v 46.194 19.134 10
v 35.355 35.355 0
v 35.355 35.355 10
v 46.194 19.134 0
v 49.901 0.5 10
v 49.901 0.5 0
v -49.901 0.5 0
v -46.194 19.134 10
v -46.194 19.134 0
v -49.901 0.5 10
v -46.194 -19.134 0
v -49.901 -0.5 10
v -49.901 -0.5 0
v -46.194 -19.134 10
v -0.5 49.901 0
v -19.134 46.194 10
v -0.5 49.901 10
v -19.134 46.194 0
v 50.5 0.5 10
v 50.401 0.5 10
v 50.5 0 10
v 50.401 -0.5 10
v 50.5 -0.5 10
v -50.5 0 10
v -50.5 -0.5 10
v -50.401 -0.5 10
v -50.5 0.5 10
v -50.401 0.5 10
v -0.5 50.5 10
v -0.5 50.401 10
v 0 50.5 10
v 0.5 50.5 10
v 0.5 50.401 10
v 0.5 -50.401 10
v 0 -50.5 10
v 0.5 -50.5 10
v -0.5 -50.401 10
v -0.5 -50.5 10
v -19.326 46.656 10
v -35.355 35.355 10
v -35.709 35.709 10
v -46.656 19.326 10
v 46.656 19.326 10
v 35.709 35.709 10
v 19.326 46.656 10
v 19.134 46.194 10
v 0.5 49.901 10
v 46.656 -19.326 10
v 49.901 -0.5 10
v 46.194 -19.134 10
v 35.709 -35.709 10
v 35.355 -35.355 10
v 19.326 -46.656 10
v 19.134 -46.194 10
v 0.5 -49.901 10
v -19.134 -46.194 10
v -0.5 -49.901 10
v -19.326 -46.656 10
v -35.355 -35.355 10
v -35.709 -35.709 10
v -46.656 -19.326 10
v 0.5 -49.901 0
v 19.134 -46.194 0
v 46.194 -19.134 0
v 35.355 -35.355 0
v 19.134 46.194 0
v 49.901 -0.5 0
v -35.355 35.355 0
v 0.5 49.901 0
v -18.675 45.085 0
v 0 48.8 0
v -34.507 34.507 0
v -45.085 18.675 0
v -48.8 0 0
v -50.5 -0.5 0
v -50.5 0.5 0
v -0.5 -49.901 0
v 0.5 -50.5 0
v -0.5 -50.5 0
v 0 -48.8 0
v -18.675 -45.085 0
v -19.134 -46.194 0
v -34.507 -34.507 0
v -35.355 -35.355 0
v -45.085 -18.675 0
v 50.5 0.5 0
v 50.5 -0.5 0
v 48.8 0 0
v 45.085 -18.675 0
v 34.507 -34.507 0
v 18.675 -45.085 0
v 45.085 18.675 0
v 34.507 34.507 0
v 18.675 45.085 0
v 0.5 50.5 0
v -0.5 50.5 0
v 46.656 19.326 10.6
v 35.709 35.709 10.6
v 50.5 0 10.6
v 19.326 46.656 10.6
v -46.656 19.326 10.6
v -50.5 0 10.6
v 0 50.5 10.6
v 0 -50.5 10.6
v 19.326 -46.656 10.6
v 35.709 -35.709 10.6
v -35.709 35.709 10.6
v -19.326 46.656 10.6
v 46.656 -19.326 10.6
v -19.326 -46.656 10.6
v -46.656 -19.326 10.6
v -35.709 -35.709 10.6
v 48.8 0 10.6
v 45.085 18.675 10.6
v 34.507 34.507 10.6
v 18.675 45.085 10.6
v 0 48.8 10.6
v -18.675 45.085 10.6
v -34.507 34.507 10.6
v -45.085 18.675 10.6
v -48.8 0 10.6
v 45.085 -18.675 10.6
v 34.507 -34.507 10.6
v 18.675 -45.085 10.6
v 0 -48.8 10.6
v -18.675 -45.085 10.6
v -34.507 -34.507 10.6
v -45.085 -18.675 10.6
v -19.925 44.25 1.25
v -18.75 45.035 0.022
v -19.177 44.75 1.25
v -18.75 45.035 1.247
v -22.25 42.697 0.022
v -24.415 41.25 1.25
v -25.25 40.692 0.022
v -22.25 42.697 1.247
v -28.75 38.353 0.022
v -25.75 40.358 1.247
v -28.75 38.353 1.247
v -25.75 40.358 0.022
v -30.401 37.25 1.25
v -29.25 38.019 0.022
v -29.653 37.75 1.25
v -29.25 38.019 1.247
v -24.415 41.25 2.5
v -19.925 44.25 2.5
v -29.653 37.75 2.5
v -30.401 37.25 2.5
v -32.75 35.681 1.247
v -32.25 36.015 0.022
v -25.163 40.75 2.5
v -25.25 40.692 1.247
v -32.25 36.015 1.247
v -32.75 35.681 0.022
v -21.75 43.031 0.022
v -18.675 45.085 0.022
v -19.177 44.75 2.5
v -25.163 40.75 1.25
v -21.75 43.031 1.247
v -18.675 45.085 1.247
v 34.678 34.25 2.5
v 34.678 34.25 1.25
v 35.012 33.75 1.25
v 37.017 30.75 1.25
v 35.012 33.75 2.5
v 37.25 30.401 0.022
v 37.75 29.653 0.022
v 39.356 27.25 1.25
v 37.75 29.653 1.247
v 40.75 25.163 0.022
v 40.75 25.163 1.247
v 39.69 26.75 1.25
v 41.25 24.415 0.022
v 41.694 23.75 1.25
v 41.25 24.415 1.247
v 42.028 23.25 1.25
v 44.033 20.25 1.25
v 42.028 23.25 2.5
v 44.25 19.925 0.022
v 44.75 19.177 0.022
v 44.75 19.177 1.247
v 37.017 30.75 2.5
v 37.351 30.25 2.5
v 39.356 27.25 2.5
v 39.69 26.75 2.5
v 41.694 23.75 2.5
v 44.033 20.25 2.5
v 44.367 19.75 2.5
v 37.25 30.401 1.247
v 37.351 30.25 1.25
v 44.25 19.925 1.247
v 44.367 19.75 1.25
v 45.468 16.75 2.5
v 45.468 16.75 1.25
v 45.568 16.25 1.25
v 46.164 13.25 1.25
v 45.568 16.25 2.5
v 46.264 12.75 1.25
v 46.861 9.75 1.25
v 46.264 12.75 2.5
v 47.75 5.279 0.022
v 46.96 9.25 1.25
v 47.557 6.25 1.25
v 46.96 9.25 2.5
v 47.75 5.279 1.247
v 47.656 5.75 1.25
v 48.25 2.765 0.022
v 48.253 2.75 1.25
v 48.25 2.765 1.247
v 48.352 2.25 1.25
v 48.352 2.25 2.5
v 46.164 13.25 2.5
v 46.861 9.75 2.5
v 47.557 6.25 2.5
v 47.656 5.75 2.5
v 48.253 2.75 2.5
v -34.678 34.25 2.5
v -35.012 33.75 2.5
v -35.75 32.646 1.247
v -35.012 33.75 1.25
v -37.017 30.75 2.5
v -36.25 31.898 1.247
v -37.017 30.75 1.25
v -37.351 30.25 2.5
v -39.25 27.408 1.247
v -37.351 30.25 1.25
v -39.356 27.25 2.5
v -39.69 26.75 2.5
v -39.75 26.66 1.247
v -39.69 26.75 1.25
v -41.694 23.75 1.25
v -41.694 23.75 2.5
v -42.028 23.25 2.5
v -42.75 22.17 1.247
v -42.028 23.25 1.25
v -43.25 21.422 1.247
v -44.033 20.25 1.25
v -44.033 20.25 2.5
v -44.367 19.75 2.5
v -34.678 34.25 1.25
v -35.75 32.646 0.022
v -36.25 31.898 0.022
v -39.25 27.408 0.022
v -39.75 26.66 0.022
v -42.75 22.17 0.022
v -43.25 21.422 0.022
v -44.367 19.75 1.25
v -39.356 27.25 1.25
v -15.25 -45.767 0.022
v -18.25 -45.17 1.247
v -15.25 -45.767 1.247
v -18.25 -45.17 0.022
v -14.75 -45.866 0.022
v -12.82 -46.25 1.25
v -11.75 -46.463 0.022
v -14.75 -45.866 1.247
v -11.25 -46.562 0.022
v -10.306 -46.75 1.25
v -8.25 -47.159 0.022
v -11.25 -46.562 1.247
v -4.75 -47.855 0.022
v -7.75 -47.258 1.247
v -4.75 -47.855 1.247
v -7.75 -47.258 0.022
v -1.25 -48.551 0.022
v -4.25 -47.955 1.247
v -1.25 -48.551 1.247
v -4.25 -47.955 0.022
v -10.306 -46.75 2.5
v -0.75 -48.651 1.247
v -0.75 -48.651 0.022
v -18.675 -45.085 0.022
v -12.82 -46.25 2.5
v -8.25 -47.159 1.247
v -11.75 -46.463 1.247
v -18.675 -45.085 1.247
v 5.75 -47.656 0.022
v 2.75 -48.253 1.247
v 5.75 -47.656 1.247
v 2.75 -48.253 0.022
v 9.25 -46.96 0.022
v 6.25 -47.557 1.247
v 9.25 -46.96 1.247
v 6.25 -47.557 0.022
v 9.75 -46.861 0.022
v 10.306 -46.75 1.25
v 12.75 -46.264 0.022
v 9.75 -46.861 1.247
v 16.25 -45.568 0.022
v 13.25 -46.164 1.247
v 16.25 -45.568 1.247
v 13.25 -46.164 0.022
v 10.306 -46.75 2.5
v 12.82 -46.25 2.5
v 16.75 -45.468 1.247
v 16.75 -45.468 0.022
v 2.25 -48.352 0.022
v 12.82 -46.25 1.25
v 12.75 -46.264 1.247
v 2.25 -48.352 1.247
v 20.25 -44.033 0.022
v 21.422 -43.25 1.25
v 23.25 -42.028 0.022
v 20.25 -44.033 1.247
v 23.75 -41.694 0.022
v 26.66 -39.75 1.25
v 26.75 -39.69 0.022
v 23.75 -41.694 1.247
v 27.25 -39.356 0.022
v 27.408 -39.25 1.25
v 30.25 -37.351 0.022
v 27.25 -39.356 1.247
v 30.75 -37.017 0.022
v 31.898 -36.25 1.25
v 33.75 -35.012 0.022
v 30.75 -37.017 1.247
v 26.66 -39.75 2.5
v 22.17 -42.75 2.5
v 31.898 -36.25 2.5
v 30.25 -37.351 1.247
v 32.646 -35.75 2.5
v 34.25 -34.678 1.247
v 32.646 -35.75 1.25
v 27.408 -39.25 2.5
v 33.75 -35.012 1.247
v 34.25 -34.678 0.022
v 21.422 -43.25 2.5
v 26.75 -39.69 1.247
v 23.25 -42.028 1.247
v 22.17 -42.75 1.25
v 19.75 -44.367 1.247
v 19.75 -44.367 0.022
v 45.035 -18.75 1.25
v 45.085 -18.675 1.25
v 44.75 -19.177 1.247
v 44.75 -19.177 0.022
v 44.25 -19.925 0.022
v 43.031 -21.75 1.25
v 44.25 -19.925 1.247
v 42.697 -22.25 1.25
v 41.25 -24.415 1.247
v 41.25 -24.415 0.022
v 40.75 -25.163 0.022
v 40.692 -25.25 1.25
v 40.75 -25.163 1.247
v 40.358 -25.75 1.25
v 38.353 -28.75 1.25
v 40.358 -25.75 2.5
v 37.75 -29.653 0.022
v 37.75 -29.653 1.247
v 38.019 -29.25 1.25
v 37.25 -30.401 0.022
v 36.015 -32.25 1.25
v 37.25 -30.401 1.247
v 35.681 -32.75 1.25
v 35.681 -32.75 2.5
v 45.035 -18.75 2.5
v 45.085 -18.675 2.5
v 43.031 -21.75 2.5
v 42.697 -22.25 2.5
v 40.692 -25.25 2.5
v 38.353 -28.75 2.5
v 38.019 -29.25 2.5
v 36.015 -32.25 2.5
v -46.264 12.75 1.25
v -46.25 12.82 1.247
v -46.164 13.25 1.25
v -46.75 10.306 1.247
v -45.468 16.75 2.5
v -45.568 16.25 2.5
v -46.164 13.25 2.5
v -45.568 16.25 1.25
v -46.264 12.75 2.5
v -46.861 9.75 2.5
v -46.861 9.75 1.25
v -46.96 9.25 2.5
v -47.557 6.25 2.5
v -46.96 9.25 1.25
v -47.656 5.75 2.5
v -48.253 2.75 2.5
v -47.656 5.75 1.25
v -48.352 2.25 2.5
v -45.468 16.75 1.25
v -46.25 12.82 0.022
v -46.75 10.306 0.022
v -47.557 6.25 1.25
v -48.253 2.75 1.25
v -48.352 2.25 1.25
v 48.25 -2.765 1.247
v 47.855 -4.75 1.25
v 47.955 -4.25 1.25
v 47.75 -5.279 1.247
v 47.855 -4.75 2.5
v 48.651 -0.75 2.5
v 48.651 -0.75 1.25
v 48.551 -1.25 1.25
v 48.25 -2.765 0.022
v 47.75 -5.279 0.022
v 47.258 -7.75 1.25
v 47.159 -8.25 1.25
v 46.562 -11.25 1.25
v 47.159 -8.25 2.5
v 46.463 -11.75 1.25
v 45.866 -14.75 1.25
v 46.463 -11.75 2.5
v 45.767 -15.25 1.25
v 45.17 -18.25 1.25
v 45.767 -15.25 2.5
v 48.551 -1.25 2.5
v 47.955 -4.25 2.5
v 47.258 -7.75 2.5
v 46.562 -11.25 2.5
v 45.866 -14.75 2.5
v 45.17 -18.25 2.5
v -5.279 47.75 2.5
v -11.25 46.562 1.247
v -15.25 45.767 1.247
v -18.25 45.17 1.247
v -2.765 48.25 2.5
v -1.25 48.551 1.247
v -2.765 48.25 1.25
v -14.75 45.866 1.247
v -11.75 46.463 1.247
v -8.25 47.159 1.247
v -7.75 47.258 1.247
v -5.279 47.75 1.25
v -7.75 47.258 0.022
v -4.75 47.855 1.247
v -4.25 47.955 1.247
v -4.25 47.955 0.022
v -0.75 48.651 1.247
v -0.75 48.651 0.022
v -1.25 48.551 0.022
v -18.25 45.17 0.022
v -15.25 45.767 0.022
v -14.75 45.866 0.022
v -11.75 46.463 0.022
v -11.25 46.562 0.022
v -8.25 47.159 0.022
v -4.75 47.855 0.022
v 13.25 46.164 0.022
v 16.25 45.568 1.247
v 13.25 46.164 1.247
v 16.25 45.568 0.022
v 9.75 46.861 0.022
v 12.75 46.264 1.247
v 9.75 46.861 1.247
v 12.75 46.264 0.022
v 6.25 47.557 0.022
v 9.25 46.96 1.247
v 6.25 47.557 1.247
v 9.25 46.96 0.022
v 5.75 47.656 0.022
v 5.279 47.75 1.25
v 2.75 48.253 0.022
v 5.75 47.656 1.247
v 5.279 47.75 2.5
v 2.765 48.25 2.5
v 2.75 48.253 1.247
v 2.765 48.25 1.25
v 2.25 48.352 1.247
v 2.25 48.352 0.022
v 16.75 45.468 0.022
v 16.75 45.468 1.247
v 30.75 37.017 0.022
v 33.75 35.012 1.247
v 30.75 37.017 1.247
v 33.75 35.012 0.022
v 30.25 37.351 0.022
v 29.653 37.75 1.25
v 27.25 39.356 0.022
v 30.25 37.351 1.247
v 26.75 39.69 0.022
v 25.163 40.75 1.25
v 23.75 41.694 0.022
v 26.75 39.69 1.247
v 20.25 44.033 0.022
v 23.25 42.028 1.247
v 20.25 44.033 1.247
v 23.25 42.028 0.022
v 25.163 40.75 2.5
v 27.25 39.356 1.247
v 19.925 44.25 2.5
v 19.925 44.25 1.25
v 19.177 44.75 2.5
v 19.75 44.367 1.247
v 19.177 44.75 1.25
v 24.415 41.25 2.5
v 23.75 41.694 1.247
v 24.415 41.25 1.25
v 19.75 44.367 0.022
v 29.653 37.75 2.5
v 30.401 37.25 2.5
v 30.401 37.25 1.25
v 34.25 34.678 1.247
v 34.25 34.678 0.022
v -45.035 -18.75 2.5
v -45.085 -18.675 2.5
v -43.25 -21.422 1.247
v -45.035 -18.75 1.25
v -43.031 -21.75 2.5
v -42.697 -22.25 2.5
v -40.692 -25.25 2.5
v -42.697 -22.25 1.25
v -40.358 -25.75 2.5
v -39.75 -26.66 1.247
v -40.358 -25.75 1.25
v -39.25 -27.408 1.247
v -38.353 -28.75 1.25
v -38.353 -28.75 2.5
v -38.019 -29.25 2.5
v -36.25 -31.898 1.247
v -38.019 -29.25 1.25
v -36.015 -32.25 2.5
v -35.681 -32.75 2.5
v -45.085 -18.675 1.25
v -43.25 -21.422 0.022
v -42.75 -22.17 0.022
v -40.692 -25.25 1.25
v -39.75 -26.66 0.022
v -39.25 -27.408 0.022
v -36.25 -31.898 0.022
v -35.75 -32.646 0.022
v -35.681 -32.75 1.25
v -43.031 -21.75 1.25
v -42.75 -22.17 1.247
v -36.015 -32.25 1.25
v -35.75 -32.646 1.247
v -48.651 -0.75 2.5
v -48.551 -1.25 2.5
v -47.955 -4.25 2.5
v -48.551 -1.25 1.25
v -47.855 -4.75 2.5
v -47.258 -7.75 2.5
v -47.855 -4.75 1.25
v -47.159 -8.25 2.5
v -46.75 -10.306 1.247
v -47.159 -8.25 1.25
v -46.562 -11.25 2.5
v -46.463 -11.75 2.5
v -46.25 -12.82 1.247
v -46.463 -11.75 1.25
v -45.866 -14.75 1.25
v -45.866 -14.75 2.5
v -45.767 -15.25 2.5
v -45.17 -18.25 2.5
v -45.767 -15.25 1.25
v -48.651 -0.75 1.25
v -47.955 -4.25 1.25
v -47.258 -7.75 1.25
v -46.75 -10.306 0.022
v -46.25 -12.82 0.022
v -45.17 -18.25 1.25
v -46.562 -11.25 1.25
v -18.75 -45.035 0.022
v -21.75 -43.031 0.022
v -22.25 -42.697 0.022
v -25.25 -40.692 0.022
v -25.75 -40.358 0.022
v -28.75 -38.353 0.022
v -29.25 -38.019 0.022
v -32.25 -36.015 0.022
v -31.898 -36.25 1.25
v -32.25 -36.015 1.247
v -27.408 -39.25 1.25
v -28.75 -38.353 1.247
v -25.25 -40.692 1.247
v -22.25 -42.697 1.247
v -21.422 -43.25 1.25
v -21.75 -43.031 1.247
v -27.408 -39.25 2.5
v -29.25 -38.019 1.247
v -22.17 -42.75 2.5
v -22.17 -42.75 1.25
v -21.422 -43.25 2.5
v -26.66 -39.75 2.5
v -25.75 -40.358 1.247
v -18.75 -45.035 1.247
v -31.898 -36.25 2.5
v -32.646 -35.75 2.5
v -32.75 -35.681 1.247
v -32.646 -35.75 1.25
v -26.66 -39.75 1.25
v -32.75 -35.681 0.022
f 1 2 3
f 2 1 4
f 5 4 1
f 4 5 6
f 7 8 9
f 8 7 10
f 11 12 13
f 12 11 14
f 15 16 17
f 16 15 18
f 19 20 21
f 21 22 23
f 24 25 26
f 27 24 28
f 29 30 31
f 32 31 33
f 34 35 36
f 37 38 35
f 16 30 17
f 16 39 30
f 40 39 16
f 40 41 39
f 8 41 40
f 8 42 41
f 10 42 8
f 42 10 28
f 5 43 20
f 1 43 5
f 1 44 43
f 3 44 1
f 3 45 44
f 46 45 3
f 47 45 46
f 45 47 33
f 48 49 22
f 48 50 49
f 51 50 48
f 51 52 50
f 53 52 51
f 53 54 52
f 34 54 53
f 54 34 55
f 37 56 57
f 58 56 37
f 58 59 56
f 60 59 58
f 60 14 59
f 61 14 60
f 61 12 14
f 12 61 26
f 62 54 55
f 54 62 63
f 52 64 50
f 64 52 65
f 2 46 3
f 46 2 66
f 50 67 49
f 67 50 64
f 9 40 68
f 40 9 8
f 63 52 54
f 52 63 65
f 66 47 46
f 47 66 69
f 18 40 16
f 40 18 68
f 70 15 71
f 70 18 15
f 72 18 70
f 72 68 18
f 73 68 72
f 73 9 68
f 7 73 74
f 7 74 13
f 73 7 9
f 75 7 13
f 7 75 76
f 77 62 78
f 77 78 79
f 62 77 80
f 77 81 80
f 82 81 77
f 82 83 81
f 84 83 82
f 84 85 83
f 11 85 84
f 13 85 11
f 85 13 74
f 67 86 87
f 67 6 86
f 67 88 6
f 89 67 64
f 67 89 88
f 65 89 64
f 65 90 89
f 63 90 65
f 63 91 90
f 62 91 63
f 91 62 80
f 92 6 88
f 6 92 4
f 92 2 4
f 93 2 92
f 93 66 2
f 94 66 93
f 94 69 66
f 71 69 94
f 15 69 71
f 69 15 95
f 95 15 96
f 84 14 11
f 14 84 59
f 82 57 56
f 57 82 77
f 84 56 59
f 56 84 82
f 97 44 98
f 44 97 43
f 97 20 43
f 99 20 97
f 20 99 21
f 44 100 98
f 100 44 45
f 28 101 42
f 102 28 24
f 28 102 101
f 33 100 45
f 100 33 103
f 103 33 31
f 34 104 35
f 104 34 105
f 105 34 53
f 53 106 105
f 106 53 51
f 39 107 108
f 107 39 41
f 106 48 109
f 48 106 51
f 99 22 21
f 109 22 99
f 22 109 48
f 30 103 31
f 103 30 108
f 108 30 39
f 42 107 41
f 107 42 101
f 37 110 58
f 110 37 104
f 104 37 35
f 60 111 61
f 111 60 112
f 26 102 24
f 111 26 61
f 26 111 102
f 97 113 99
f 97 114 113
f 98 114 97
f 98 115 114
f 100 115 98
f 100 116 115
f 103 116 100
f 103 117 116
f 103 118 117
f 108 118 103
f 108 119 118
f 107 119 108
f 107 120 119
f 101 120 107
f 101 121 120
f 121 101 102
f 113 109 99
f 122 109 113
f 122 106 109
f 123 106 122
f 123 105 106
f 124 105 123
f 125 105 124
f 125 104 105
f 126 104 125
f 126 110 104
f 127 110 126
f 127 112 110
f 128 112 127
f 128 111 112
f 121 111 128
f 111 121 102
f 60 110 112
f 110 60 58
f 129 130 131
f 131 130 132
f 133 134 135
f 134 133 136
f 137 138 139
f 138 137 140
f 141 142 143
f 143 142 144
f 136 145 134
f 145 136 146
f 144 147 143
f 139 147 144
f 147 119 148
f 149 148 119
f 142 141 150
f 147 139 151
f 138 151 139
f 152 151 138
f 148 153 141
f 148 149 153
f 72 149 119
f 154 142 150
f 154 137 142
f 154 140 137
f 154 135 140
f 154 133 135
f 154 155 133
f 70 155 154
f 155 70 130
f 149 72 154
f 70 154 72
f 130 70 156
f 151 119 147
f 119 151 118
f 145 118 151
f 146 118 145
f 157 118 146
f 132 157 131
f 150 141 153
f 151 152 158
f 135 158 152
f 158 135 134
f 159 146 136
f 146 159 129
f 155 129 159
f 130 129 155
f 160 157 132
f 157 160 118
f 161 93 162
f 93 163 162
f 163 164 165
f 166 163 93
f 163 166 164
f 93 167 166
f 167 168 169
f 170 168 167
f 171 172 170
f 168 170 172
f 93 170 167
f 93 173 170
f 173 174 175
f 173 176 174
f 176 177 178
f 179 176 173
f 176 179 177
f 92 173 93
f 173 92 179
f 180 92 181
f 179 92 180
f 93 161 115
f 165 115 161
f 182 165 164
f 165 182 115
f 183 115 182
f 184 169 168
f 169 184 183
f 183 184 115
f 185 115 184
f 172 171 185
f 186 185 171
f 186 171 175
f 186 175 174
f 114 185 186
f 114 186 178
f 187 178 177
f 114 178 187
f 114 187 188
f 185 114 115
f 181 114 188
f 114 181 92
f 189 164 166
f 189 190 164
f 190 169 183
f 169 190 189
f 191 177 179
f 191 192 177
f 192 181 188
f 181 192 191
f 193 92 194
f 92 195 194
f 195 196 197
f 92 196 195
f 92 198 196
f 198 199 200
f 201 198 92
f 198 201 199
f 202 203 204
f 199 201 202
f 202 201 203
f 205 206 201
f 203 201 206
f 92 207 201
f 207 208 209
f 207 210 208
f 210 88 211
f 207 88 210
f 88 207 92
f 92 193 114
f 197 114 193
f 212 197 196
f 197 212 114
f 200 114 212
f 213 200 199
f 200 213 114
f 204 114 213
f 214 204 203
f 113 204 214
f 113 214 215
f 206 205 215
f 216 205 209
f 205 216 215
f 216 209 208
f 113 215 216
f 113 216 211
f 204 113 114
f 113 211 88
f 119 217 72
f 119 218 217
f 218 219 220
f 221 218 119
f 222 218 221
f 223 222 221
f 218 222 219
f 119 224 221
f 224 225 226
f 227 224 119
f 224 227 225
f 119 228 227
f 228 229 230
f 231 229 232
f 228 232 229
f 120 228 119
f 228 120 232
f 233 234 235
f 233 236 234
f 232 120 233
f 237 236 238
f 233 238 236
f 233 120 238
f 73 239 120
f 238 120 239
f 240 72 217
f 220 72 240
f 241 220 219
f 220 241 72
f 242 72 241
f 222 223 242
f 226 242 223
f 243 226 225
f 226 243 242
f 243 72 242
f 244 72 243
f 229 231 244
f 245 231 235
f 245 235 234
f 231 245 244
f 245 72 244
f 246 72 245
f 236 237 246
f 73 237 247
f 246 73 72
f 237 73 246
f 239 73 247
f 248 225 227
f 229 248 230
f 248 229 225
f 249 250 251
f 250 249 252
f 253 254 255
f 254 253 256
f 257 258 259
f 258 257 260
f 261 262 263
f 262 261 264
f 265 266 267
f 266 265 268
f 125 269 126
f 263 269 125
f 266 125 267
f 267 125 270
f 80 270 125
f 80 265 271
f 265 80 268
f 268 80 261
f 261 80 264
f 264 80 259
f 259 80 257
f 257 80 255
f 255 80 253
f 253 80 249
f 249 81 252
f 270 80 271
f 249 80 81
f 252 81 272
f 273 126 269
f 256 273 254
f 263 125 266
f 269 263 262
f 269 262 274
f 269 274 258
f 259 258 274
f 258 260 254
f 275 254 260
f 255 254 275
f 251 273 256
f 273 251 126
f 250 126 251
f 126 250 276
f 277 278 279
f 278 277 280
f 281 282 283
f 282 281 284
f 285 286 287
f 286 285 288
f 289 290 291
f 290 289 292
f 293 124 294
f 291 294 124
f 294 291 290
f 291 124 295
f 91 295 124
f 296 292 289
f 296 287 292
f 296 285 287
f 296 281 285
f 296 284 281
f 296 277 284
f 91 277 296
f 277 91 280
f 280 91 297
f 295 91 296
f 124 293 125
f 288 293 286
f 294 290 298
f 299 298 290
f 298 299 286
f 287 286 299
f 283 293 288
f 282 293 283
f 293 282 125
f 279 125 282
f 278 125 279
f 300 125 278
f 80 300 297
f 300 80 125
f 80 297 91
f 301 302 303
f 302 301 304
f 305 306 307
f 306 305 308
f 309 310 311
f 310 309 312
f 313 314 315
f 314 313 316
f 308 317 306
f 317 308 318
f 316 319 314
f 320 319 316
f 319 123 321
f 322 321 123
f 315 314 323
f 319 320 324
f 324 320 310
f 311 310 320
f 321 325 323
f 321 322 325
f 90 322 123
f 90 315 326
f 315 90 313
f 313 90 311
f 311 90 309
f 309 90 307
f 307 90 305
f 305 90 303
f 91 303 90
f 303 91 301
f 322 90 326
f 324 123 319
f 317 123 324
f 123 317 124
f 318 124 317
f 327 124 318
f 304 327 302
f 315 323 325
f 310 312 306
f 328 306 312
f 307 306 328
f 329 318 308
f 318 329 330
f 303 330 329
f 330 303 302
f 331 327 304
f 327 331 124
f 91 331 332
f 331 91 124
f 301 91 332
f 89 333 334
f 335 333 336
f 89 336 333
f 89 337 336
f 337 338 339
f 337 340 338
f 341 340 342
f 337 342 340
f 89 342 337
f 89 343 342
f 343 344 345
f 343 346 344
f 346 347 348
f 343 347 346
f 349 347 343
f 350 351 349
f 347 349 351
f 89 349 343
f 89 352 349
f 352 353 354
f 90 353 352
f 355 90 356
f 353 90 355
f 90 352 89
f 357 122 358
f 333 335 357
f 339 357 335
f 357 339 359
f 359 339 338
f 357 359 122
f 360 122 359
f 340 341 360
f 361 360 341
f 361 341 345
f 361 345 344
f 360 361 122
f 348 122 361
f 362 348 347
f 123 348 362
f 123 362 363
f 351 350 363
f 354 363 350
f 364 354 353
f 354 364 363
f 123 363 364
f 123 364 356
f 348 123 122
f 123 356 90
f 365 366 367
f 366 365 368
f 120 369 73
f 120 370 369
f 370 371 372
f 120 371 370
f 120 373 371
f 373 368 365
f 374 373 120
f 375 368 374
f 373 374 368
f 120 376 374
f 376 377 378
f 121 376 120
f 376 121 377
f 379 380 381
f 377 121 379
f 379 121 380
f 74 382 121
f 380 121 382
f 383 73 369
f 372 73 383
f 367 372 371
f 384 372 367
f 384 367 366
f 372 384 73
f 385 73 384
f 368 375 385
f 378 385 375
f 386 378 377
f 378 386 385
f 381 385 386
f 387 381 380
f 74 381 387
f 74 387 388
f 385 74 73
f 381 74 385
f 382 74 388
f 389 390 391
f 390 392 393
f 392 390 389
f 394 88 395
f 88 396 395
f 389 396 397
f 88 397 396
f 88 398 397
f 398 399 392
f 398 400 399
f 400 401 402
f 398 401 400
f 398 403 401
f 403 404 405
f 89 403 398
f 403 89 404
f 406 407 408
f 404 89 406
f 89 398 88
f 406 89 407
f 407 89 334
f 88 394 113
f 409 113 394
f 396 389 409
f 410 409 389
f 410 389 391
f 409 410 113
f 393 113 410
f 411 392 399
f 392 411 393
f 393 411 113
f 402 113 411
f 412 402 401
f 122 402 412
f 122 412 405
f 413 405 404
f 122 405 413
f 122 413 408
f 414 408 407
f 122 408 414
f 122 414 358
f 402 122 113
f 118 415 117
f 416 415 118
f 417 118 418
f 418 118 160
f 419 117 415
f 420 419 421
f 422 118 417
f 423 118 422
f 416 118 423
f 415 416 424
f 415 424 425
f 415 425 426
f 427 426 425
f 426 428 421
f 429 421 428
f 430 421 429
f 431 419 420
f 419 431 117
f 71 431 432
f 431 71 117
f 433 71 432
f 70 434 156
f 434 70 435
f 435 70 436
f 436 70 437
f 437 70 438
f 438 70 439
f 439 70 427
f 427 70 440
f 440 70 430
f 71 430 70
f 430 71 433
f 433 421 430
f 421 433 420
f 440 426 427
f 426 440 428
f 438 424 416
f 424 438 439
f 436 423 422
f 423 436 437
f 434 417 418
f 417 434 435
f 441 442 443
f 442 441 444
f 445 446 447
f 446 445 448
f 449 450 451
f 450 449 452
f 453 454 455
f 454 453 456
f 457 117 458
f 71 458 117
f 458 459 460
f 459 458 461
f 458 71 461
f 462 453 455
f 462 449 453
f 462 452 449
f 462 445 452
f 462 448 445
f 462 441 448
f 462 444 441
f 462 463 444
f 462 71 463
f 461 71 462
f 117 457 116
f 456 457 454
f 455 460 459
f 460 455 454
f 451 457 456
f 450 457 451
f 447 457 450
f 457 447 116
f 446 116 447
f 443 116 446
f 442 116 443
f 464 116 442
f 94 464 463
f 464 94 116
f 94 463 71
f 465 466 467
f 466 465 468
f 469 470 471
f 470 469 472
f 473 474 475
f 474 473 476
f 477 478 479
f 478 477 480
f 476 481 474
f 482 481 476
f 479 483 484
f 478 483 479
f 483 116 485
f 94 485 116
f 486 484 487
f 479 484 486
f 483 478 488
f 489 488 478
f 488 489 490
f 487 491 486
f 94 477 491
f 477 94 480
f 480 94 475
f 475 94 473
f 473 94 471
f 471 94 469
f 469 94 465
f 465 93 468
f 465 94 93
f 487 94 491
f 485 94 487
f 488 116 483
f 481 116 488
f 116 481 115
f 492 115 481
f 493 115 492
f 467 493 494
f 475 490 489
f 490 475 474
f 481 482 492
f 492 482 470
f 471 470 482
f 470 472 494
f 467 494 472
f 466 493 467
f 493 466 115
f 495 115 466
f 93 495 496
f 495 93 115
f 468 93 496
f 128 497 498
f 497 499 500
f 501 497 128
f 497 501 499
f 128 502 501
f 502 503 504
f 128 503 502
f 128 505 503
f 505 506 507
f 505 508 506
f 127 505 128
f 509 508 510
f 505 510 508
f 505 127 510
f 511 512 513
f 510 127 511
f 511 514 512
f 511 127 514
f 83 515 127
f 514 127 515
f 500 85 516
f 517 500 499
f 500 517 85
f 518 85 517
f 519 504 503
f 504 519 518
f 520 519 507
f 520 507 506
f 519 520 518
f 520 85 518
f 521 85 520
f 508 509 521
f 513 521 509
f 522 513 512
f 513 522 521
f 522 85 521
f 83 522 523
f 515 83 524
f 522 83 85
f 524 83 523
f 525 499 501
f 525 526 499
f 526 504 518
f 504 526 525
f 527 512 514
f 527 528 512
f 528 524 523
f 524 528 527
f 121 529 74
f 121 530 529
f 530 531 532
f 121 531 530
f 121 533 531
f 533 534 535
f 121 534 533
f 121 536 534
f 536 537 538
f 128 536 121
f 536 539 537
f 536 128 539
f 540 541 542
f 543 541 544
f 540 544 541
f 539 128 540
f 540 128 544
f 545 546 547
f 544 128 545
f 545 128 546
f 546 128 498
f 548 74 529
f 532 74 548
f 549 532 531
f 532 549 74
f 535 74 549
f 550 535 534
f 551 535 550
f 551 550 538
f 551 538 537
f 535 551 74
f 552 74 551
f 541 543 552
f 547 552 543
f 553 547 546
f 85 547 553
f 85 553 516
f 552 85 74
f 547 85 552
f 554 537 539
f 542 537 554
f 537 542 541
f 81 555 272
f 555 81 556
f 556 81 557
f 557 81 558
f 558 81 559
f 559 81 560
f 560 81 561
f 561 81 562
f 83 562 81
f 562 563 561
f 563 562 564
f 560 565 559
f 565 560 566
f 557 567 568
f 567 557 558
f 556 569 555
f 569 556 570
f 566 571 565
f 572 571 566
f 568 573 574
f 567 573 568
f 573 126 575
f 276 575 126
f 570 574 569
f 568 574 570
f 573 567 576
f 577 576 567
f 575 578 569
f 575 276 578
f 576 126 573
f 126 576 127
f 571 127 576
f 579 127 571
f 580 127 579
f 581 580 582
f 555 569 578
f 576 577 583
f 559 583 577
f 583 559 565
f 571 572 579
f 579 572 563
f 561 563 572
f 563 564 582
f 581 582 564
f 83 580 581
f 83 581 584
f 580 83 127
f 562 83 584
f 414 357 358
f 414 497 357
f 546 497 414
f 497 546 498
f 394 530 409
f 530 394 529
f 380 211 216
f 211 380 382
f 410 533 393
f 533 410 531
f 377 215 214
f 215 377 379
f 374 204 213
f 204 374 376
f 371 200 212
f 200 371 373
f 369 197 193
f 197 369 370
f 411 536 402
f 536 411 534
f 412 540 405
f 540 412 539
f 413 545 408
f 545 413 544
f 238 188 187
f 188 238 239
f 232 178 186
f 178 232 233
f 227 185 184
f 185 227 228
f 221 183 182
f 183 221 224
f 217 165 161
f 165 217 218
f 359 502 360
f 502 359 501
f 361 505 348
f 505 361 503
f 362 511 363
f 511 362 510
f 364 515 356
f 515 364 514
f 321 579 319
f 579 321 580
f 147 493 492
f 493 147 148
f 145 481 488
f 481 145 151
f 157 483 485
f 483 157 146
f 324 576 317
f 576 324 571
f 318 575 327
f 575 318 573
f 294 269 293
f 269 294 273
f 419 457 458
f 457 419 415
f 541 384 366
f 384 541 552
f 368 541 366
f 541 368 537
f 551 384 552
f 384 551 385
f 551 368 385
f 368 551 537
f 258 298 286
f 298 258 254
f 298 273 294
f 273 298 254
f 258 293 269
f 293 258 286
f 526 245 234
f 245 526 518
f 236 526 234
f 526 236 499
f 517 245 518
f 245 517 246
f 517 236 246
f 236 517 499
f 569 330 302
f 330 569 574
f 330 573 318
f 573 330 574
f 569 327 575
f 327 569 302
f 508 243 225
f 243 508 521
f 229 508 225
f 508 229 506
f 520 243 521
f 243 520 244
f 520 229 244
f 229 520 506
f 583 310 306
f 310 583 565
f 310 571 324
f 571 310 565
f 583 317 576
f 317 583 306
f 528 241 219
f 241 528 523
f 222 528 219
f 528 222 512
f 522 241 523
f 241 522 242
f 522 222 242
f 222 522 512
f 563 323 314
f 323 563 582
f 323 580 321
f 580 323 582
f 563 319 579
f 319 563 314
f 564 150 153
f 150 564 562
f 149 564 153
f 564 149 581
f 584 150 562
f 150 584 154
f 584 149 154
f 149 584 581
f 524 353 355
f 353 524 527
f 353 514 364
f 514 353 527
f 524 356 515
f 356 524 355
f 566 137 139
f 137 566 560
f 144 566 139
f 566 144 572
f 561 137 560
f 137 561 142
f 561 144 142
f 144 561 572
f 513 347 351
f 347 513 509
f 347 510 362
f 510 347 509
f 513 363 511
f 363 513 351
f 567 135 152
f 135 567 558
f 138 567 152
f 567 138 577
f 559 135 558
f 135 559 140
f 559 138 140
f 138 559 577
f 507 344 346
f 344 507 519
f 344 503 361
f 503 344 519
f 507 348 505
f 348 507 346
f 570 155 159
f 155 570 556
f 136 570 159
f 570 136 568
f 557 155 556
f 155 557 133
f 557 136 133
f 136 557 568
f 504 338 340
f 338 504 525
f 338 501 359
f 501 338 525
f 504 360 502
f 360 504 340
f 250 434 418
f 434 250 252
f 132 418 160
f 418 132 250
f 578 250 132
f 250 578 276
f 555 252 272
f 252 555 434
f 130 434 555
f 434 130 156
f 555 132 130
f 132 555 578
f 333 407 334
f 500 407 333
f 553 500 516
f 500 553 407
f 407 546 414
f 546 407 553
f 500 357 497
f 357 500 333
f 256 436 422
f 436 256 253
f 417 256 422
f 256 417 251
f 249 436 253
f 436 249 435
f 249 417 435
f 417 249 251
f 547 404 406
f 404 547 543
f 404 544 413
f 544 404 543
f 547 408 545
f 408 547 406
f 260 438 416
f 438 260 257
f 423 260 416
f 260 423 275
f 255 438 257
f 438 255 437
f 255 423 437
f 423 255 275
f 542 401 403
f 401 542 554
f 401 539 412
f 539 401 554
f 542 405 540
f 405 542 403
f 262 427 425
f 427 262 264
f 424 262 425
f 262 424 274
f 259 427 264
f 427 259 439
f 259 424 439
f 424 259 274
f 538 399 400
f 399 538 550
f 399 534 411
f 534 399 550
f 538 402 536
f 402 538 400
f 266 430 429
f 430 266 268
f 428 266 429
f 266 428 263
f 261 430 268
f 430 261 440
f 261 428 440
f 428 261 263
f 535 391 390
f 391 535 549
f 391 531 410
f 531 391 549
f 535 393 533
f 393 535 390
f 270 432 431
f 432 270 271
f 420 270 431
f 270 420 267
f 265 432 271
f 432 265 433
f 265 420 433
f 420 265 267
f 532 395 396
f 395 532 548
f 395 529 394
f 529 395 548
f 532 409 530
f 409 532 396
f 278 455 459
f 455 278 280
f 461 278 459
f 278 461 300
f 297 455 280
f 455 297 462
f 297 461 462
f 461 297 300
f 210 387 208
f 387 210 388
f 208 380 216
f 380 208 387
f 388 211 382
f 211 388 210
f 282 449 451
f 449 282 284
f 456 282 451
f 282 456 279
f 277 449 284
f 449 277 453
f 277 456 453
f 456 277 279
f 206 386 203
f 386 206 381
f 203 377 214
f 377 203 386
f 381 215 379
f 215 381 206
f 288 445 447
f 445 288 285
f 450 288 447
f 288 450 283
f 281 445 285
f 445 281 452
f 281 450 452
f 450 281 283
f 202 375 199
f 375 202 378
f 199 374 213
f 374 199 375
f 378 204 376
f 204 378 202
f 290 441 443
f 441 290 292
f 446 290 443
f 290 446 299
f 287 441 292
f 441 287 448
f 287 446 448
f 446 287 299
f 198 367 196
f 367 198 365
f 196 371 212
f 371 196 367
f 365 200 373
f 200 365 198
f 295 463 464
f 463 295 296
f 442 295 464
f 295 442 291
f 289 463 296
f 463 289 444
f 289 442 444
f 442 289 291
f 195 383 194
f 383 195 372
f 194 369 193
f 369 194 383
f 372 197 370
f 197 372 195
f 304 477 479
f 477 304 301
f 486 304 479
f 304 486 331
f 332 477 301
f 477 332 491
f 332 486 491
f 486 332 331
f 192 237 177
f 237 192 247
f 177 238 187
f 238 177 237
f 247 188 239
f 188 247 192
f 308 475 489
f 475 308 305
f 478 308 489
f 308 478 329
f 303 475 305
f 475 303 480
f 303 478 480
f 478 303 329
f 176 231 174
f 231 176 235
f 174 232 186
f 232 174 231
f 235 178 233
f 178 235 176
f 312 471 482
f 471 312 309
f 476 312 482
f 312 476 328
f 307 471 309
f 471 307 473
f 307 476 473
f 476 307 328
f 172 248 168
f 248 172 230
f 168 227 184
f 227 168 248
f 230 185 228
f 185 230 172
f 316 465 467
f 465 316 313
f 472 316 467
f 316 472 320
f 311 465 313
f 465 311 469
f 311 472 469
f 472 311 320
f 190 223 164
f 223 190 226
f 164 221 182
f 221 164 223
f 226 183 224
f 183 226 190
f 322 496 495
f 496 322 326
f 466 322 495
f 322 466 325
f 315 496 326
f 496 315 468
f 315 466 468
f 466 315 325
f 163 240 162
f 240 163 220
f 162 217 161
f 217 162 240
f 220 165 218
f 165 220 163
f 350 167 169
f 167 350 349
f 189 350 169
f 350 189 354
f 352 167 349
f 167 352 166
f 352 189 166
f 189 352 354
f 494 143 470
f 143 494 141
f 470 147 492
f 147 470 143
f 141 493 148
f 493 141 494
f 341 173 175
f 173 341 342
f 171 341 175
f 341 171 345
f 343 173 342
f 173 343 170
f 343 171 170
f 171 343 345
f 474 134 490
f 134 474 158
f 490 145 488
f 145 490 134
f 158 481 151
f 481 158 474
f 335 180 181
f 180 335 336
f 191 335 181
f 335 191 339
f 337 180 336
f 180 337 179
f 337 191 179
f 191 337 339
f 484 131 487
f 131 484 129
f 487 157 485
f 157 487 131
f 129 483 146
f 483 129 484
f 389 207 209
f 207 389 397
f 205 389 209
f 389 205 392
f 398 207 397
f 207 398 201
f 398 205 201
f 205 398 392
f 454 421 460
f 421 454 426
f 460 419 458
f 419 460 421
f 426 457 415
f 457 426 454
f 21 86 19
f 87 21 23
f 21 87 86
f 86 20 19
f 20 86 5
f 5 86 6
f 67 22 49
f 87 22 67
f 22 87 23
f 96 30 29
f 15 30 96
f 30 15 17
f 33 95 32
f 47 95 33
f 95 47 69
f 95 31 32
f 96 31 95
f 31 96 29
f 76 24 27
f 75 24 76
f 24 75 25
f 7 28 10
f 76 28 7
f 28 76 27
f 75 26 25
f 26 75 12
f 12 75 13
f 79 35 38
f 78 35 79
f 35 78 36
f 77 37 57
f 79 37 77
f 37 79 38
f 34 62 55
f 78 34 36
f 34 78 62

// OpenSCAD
// [FL_INDEX: keywords="openscad, 3d_parametric, Screen_Customizer, csg_solid" | COT="Parametric OpenSCAD design from 3DCodeverse"]
// Title: Screen Customizer

// Custom Screen to fill a hole (c) 2013 David Smith
// licensed under the Creative Commons - GNU GPL license.
// http://www.thingiverse.com/thing:112117

/* [Hole] */

// Hole Shape 
shape= 16; // [ 3:Triangle, 4:Square, 5:Pentagon, 6:Hexagon, 8:Octagon, 16:Rough Circle, 128:Smooth Circle ]

// Diameter of a circle connecting all the points definiting your hole's shape (mm). 
diameter = 100; 

// Hole depth (mm)
depth = 10 ; 

// Width of the screen's frame (mm).
frame_thickness = 1.2;

// Size of the border (mm). Only 'flush' screens have borders. 
border_size = 2.4;

/* [Screen] */

// Spacing between mesh threads (mm). 
mesh_space=3;

// Thickness of the screen (mm). It should be a multiple of your slicer's layer height for best results.
mesh_height=2.5; 

// Screen is flush to the surface or recessed.
indention = 0; // [0:Recessed, 1:Flush]

/* [Slicer] */

// The thickness of your slices (mm). Screen threads are a multiple of this for their height.
printer_layer_height = 0.25;  

// The shell or skin size of your slicer (mm) .
printer_skin_size =    0.6;

// The width of your extruded filament (mm). Screen threads are a multiple of this for their width. 
printer_extrusion_width = 0.5;

/* [Hidden] */
 
smooth = shape;

custom_shape_screen();

module custom_shape_screen() {
union() {
	difference() {   
		union() {
			cylinder(h=depth, r=diameter/2, $fn=smooth);		

			if (indention == 1)  
				// Brim if screen is flush and at the bottom 
				cylinder(h=frame_thickness, r=(border_size + diameter/2), $fn=smooth);
			else
				// OR add a small brim on the bottom side (that prints on top)
				translate([0,0,depth])
				cylinder(h=printer_skin_size, r=(printer_extrusion_width + diameter/2), $fn=smooth);
		}

		translate([0,0,-1])
		cylinder(h=depth+3, r=(diameter/2)-frame_thickness, $fn=smooth);
	}

	meshscreen_shape(h=mesh_height,
				mesh_w=printer_extrusion_width,
				mesh_space=mesh_space,
				width=diameter,
				layer_h=printer_layer_height);

	// Make little nubs on the sides to tighten the fit a little (but only for circles).
	if (smooth > 8)
	for (i = [0:3]) {
		rotate(90*i,[0,0,1])
		translate([(diameter/2),0,depth/2])
		cube(size=[1,1,depth],center=true);
	}
}
}

module meshscreen_shape(h=2,mesh_w=1,mesh_space=2,width=60,layer_h){
	intersection(){
		cylinder(r=width/2,h,$fn=smooth);
		mesh_raw(h=h,mesh_w=mesh_w,mesh_space=mesh_space,width=width,layer_height=layer_h);
	}
	difference(){
		cylinder(r=width/2,h, $fn=smooth);
		translate([0,0,-h*0.05]) cylinder(r=width/2-0,h=h*1.1, $fn=smooth);
	}
}

module mesh_raw(h=2,mesh_w=1,mesh_space=2,width=50,layer_height){
	for ( j = [0 :(mesh_w+mesh_space): width] )
	{
	   	translate([0,0,0.01])translate([-width/2+j, 0, h/4])cube([mesh_w,width,h/2-layer_height/10],center=true);
		translate([0,0,h/2])translate([0, -width/2+j, h/4])cube([width,mesh_w,h/2],center=true);
	}
}
